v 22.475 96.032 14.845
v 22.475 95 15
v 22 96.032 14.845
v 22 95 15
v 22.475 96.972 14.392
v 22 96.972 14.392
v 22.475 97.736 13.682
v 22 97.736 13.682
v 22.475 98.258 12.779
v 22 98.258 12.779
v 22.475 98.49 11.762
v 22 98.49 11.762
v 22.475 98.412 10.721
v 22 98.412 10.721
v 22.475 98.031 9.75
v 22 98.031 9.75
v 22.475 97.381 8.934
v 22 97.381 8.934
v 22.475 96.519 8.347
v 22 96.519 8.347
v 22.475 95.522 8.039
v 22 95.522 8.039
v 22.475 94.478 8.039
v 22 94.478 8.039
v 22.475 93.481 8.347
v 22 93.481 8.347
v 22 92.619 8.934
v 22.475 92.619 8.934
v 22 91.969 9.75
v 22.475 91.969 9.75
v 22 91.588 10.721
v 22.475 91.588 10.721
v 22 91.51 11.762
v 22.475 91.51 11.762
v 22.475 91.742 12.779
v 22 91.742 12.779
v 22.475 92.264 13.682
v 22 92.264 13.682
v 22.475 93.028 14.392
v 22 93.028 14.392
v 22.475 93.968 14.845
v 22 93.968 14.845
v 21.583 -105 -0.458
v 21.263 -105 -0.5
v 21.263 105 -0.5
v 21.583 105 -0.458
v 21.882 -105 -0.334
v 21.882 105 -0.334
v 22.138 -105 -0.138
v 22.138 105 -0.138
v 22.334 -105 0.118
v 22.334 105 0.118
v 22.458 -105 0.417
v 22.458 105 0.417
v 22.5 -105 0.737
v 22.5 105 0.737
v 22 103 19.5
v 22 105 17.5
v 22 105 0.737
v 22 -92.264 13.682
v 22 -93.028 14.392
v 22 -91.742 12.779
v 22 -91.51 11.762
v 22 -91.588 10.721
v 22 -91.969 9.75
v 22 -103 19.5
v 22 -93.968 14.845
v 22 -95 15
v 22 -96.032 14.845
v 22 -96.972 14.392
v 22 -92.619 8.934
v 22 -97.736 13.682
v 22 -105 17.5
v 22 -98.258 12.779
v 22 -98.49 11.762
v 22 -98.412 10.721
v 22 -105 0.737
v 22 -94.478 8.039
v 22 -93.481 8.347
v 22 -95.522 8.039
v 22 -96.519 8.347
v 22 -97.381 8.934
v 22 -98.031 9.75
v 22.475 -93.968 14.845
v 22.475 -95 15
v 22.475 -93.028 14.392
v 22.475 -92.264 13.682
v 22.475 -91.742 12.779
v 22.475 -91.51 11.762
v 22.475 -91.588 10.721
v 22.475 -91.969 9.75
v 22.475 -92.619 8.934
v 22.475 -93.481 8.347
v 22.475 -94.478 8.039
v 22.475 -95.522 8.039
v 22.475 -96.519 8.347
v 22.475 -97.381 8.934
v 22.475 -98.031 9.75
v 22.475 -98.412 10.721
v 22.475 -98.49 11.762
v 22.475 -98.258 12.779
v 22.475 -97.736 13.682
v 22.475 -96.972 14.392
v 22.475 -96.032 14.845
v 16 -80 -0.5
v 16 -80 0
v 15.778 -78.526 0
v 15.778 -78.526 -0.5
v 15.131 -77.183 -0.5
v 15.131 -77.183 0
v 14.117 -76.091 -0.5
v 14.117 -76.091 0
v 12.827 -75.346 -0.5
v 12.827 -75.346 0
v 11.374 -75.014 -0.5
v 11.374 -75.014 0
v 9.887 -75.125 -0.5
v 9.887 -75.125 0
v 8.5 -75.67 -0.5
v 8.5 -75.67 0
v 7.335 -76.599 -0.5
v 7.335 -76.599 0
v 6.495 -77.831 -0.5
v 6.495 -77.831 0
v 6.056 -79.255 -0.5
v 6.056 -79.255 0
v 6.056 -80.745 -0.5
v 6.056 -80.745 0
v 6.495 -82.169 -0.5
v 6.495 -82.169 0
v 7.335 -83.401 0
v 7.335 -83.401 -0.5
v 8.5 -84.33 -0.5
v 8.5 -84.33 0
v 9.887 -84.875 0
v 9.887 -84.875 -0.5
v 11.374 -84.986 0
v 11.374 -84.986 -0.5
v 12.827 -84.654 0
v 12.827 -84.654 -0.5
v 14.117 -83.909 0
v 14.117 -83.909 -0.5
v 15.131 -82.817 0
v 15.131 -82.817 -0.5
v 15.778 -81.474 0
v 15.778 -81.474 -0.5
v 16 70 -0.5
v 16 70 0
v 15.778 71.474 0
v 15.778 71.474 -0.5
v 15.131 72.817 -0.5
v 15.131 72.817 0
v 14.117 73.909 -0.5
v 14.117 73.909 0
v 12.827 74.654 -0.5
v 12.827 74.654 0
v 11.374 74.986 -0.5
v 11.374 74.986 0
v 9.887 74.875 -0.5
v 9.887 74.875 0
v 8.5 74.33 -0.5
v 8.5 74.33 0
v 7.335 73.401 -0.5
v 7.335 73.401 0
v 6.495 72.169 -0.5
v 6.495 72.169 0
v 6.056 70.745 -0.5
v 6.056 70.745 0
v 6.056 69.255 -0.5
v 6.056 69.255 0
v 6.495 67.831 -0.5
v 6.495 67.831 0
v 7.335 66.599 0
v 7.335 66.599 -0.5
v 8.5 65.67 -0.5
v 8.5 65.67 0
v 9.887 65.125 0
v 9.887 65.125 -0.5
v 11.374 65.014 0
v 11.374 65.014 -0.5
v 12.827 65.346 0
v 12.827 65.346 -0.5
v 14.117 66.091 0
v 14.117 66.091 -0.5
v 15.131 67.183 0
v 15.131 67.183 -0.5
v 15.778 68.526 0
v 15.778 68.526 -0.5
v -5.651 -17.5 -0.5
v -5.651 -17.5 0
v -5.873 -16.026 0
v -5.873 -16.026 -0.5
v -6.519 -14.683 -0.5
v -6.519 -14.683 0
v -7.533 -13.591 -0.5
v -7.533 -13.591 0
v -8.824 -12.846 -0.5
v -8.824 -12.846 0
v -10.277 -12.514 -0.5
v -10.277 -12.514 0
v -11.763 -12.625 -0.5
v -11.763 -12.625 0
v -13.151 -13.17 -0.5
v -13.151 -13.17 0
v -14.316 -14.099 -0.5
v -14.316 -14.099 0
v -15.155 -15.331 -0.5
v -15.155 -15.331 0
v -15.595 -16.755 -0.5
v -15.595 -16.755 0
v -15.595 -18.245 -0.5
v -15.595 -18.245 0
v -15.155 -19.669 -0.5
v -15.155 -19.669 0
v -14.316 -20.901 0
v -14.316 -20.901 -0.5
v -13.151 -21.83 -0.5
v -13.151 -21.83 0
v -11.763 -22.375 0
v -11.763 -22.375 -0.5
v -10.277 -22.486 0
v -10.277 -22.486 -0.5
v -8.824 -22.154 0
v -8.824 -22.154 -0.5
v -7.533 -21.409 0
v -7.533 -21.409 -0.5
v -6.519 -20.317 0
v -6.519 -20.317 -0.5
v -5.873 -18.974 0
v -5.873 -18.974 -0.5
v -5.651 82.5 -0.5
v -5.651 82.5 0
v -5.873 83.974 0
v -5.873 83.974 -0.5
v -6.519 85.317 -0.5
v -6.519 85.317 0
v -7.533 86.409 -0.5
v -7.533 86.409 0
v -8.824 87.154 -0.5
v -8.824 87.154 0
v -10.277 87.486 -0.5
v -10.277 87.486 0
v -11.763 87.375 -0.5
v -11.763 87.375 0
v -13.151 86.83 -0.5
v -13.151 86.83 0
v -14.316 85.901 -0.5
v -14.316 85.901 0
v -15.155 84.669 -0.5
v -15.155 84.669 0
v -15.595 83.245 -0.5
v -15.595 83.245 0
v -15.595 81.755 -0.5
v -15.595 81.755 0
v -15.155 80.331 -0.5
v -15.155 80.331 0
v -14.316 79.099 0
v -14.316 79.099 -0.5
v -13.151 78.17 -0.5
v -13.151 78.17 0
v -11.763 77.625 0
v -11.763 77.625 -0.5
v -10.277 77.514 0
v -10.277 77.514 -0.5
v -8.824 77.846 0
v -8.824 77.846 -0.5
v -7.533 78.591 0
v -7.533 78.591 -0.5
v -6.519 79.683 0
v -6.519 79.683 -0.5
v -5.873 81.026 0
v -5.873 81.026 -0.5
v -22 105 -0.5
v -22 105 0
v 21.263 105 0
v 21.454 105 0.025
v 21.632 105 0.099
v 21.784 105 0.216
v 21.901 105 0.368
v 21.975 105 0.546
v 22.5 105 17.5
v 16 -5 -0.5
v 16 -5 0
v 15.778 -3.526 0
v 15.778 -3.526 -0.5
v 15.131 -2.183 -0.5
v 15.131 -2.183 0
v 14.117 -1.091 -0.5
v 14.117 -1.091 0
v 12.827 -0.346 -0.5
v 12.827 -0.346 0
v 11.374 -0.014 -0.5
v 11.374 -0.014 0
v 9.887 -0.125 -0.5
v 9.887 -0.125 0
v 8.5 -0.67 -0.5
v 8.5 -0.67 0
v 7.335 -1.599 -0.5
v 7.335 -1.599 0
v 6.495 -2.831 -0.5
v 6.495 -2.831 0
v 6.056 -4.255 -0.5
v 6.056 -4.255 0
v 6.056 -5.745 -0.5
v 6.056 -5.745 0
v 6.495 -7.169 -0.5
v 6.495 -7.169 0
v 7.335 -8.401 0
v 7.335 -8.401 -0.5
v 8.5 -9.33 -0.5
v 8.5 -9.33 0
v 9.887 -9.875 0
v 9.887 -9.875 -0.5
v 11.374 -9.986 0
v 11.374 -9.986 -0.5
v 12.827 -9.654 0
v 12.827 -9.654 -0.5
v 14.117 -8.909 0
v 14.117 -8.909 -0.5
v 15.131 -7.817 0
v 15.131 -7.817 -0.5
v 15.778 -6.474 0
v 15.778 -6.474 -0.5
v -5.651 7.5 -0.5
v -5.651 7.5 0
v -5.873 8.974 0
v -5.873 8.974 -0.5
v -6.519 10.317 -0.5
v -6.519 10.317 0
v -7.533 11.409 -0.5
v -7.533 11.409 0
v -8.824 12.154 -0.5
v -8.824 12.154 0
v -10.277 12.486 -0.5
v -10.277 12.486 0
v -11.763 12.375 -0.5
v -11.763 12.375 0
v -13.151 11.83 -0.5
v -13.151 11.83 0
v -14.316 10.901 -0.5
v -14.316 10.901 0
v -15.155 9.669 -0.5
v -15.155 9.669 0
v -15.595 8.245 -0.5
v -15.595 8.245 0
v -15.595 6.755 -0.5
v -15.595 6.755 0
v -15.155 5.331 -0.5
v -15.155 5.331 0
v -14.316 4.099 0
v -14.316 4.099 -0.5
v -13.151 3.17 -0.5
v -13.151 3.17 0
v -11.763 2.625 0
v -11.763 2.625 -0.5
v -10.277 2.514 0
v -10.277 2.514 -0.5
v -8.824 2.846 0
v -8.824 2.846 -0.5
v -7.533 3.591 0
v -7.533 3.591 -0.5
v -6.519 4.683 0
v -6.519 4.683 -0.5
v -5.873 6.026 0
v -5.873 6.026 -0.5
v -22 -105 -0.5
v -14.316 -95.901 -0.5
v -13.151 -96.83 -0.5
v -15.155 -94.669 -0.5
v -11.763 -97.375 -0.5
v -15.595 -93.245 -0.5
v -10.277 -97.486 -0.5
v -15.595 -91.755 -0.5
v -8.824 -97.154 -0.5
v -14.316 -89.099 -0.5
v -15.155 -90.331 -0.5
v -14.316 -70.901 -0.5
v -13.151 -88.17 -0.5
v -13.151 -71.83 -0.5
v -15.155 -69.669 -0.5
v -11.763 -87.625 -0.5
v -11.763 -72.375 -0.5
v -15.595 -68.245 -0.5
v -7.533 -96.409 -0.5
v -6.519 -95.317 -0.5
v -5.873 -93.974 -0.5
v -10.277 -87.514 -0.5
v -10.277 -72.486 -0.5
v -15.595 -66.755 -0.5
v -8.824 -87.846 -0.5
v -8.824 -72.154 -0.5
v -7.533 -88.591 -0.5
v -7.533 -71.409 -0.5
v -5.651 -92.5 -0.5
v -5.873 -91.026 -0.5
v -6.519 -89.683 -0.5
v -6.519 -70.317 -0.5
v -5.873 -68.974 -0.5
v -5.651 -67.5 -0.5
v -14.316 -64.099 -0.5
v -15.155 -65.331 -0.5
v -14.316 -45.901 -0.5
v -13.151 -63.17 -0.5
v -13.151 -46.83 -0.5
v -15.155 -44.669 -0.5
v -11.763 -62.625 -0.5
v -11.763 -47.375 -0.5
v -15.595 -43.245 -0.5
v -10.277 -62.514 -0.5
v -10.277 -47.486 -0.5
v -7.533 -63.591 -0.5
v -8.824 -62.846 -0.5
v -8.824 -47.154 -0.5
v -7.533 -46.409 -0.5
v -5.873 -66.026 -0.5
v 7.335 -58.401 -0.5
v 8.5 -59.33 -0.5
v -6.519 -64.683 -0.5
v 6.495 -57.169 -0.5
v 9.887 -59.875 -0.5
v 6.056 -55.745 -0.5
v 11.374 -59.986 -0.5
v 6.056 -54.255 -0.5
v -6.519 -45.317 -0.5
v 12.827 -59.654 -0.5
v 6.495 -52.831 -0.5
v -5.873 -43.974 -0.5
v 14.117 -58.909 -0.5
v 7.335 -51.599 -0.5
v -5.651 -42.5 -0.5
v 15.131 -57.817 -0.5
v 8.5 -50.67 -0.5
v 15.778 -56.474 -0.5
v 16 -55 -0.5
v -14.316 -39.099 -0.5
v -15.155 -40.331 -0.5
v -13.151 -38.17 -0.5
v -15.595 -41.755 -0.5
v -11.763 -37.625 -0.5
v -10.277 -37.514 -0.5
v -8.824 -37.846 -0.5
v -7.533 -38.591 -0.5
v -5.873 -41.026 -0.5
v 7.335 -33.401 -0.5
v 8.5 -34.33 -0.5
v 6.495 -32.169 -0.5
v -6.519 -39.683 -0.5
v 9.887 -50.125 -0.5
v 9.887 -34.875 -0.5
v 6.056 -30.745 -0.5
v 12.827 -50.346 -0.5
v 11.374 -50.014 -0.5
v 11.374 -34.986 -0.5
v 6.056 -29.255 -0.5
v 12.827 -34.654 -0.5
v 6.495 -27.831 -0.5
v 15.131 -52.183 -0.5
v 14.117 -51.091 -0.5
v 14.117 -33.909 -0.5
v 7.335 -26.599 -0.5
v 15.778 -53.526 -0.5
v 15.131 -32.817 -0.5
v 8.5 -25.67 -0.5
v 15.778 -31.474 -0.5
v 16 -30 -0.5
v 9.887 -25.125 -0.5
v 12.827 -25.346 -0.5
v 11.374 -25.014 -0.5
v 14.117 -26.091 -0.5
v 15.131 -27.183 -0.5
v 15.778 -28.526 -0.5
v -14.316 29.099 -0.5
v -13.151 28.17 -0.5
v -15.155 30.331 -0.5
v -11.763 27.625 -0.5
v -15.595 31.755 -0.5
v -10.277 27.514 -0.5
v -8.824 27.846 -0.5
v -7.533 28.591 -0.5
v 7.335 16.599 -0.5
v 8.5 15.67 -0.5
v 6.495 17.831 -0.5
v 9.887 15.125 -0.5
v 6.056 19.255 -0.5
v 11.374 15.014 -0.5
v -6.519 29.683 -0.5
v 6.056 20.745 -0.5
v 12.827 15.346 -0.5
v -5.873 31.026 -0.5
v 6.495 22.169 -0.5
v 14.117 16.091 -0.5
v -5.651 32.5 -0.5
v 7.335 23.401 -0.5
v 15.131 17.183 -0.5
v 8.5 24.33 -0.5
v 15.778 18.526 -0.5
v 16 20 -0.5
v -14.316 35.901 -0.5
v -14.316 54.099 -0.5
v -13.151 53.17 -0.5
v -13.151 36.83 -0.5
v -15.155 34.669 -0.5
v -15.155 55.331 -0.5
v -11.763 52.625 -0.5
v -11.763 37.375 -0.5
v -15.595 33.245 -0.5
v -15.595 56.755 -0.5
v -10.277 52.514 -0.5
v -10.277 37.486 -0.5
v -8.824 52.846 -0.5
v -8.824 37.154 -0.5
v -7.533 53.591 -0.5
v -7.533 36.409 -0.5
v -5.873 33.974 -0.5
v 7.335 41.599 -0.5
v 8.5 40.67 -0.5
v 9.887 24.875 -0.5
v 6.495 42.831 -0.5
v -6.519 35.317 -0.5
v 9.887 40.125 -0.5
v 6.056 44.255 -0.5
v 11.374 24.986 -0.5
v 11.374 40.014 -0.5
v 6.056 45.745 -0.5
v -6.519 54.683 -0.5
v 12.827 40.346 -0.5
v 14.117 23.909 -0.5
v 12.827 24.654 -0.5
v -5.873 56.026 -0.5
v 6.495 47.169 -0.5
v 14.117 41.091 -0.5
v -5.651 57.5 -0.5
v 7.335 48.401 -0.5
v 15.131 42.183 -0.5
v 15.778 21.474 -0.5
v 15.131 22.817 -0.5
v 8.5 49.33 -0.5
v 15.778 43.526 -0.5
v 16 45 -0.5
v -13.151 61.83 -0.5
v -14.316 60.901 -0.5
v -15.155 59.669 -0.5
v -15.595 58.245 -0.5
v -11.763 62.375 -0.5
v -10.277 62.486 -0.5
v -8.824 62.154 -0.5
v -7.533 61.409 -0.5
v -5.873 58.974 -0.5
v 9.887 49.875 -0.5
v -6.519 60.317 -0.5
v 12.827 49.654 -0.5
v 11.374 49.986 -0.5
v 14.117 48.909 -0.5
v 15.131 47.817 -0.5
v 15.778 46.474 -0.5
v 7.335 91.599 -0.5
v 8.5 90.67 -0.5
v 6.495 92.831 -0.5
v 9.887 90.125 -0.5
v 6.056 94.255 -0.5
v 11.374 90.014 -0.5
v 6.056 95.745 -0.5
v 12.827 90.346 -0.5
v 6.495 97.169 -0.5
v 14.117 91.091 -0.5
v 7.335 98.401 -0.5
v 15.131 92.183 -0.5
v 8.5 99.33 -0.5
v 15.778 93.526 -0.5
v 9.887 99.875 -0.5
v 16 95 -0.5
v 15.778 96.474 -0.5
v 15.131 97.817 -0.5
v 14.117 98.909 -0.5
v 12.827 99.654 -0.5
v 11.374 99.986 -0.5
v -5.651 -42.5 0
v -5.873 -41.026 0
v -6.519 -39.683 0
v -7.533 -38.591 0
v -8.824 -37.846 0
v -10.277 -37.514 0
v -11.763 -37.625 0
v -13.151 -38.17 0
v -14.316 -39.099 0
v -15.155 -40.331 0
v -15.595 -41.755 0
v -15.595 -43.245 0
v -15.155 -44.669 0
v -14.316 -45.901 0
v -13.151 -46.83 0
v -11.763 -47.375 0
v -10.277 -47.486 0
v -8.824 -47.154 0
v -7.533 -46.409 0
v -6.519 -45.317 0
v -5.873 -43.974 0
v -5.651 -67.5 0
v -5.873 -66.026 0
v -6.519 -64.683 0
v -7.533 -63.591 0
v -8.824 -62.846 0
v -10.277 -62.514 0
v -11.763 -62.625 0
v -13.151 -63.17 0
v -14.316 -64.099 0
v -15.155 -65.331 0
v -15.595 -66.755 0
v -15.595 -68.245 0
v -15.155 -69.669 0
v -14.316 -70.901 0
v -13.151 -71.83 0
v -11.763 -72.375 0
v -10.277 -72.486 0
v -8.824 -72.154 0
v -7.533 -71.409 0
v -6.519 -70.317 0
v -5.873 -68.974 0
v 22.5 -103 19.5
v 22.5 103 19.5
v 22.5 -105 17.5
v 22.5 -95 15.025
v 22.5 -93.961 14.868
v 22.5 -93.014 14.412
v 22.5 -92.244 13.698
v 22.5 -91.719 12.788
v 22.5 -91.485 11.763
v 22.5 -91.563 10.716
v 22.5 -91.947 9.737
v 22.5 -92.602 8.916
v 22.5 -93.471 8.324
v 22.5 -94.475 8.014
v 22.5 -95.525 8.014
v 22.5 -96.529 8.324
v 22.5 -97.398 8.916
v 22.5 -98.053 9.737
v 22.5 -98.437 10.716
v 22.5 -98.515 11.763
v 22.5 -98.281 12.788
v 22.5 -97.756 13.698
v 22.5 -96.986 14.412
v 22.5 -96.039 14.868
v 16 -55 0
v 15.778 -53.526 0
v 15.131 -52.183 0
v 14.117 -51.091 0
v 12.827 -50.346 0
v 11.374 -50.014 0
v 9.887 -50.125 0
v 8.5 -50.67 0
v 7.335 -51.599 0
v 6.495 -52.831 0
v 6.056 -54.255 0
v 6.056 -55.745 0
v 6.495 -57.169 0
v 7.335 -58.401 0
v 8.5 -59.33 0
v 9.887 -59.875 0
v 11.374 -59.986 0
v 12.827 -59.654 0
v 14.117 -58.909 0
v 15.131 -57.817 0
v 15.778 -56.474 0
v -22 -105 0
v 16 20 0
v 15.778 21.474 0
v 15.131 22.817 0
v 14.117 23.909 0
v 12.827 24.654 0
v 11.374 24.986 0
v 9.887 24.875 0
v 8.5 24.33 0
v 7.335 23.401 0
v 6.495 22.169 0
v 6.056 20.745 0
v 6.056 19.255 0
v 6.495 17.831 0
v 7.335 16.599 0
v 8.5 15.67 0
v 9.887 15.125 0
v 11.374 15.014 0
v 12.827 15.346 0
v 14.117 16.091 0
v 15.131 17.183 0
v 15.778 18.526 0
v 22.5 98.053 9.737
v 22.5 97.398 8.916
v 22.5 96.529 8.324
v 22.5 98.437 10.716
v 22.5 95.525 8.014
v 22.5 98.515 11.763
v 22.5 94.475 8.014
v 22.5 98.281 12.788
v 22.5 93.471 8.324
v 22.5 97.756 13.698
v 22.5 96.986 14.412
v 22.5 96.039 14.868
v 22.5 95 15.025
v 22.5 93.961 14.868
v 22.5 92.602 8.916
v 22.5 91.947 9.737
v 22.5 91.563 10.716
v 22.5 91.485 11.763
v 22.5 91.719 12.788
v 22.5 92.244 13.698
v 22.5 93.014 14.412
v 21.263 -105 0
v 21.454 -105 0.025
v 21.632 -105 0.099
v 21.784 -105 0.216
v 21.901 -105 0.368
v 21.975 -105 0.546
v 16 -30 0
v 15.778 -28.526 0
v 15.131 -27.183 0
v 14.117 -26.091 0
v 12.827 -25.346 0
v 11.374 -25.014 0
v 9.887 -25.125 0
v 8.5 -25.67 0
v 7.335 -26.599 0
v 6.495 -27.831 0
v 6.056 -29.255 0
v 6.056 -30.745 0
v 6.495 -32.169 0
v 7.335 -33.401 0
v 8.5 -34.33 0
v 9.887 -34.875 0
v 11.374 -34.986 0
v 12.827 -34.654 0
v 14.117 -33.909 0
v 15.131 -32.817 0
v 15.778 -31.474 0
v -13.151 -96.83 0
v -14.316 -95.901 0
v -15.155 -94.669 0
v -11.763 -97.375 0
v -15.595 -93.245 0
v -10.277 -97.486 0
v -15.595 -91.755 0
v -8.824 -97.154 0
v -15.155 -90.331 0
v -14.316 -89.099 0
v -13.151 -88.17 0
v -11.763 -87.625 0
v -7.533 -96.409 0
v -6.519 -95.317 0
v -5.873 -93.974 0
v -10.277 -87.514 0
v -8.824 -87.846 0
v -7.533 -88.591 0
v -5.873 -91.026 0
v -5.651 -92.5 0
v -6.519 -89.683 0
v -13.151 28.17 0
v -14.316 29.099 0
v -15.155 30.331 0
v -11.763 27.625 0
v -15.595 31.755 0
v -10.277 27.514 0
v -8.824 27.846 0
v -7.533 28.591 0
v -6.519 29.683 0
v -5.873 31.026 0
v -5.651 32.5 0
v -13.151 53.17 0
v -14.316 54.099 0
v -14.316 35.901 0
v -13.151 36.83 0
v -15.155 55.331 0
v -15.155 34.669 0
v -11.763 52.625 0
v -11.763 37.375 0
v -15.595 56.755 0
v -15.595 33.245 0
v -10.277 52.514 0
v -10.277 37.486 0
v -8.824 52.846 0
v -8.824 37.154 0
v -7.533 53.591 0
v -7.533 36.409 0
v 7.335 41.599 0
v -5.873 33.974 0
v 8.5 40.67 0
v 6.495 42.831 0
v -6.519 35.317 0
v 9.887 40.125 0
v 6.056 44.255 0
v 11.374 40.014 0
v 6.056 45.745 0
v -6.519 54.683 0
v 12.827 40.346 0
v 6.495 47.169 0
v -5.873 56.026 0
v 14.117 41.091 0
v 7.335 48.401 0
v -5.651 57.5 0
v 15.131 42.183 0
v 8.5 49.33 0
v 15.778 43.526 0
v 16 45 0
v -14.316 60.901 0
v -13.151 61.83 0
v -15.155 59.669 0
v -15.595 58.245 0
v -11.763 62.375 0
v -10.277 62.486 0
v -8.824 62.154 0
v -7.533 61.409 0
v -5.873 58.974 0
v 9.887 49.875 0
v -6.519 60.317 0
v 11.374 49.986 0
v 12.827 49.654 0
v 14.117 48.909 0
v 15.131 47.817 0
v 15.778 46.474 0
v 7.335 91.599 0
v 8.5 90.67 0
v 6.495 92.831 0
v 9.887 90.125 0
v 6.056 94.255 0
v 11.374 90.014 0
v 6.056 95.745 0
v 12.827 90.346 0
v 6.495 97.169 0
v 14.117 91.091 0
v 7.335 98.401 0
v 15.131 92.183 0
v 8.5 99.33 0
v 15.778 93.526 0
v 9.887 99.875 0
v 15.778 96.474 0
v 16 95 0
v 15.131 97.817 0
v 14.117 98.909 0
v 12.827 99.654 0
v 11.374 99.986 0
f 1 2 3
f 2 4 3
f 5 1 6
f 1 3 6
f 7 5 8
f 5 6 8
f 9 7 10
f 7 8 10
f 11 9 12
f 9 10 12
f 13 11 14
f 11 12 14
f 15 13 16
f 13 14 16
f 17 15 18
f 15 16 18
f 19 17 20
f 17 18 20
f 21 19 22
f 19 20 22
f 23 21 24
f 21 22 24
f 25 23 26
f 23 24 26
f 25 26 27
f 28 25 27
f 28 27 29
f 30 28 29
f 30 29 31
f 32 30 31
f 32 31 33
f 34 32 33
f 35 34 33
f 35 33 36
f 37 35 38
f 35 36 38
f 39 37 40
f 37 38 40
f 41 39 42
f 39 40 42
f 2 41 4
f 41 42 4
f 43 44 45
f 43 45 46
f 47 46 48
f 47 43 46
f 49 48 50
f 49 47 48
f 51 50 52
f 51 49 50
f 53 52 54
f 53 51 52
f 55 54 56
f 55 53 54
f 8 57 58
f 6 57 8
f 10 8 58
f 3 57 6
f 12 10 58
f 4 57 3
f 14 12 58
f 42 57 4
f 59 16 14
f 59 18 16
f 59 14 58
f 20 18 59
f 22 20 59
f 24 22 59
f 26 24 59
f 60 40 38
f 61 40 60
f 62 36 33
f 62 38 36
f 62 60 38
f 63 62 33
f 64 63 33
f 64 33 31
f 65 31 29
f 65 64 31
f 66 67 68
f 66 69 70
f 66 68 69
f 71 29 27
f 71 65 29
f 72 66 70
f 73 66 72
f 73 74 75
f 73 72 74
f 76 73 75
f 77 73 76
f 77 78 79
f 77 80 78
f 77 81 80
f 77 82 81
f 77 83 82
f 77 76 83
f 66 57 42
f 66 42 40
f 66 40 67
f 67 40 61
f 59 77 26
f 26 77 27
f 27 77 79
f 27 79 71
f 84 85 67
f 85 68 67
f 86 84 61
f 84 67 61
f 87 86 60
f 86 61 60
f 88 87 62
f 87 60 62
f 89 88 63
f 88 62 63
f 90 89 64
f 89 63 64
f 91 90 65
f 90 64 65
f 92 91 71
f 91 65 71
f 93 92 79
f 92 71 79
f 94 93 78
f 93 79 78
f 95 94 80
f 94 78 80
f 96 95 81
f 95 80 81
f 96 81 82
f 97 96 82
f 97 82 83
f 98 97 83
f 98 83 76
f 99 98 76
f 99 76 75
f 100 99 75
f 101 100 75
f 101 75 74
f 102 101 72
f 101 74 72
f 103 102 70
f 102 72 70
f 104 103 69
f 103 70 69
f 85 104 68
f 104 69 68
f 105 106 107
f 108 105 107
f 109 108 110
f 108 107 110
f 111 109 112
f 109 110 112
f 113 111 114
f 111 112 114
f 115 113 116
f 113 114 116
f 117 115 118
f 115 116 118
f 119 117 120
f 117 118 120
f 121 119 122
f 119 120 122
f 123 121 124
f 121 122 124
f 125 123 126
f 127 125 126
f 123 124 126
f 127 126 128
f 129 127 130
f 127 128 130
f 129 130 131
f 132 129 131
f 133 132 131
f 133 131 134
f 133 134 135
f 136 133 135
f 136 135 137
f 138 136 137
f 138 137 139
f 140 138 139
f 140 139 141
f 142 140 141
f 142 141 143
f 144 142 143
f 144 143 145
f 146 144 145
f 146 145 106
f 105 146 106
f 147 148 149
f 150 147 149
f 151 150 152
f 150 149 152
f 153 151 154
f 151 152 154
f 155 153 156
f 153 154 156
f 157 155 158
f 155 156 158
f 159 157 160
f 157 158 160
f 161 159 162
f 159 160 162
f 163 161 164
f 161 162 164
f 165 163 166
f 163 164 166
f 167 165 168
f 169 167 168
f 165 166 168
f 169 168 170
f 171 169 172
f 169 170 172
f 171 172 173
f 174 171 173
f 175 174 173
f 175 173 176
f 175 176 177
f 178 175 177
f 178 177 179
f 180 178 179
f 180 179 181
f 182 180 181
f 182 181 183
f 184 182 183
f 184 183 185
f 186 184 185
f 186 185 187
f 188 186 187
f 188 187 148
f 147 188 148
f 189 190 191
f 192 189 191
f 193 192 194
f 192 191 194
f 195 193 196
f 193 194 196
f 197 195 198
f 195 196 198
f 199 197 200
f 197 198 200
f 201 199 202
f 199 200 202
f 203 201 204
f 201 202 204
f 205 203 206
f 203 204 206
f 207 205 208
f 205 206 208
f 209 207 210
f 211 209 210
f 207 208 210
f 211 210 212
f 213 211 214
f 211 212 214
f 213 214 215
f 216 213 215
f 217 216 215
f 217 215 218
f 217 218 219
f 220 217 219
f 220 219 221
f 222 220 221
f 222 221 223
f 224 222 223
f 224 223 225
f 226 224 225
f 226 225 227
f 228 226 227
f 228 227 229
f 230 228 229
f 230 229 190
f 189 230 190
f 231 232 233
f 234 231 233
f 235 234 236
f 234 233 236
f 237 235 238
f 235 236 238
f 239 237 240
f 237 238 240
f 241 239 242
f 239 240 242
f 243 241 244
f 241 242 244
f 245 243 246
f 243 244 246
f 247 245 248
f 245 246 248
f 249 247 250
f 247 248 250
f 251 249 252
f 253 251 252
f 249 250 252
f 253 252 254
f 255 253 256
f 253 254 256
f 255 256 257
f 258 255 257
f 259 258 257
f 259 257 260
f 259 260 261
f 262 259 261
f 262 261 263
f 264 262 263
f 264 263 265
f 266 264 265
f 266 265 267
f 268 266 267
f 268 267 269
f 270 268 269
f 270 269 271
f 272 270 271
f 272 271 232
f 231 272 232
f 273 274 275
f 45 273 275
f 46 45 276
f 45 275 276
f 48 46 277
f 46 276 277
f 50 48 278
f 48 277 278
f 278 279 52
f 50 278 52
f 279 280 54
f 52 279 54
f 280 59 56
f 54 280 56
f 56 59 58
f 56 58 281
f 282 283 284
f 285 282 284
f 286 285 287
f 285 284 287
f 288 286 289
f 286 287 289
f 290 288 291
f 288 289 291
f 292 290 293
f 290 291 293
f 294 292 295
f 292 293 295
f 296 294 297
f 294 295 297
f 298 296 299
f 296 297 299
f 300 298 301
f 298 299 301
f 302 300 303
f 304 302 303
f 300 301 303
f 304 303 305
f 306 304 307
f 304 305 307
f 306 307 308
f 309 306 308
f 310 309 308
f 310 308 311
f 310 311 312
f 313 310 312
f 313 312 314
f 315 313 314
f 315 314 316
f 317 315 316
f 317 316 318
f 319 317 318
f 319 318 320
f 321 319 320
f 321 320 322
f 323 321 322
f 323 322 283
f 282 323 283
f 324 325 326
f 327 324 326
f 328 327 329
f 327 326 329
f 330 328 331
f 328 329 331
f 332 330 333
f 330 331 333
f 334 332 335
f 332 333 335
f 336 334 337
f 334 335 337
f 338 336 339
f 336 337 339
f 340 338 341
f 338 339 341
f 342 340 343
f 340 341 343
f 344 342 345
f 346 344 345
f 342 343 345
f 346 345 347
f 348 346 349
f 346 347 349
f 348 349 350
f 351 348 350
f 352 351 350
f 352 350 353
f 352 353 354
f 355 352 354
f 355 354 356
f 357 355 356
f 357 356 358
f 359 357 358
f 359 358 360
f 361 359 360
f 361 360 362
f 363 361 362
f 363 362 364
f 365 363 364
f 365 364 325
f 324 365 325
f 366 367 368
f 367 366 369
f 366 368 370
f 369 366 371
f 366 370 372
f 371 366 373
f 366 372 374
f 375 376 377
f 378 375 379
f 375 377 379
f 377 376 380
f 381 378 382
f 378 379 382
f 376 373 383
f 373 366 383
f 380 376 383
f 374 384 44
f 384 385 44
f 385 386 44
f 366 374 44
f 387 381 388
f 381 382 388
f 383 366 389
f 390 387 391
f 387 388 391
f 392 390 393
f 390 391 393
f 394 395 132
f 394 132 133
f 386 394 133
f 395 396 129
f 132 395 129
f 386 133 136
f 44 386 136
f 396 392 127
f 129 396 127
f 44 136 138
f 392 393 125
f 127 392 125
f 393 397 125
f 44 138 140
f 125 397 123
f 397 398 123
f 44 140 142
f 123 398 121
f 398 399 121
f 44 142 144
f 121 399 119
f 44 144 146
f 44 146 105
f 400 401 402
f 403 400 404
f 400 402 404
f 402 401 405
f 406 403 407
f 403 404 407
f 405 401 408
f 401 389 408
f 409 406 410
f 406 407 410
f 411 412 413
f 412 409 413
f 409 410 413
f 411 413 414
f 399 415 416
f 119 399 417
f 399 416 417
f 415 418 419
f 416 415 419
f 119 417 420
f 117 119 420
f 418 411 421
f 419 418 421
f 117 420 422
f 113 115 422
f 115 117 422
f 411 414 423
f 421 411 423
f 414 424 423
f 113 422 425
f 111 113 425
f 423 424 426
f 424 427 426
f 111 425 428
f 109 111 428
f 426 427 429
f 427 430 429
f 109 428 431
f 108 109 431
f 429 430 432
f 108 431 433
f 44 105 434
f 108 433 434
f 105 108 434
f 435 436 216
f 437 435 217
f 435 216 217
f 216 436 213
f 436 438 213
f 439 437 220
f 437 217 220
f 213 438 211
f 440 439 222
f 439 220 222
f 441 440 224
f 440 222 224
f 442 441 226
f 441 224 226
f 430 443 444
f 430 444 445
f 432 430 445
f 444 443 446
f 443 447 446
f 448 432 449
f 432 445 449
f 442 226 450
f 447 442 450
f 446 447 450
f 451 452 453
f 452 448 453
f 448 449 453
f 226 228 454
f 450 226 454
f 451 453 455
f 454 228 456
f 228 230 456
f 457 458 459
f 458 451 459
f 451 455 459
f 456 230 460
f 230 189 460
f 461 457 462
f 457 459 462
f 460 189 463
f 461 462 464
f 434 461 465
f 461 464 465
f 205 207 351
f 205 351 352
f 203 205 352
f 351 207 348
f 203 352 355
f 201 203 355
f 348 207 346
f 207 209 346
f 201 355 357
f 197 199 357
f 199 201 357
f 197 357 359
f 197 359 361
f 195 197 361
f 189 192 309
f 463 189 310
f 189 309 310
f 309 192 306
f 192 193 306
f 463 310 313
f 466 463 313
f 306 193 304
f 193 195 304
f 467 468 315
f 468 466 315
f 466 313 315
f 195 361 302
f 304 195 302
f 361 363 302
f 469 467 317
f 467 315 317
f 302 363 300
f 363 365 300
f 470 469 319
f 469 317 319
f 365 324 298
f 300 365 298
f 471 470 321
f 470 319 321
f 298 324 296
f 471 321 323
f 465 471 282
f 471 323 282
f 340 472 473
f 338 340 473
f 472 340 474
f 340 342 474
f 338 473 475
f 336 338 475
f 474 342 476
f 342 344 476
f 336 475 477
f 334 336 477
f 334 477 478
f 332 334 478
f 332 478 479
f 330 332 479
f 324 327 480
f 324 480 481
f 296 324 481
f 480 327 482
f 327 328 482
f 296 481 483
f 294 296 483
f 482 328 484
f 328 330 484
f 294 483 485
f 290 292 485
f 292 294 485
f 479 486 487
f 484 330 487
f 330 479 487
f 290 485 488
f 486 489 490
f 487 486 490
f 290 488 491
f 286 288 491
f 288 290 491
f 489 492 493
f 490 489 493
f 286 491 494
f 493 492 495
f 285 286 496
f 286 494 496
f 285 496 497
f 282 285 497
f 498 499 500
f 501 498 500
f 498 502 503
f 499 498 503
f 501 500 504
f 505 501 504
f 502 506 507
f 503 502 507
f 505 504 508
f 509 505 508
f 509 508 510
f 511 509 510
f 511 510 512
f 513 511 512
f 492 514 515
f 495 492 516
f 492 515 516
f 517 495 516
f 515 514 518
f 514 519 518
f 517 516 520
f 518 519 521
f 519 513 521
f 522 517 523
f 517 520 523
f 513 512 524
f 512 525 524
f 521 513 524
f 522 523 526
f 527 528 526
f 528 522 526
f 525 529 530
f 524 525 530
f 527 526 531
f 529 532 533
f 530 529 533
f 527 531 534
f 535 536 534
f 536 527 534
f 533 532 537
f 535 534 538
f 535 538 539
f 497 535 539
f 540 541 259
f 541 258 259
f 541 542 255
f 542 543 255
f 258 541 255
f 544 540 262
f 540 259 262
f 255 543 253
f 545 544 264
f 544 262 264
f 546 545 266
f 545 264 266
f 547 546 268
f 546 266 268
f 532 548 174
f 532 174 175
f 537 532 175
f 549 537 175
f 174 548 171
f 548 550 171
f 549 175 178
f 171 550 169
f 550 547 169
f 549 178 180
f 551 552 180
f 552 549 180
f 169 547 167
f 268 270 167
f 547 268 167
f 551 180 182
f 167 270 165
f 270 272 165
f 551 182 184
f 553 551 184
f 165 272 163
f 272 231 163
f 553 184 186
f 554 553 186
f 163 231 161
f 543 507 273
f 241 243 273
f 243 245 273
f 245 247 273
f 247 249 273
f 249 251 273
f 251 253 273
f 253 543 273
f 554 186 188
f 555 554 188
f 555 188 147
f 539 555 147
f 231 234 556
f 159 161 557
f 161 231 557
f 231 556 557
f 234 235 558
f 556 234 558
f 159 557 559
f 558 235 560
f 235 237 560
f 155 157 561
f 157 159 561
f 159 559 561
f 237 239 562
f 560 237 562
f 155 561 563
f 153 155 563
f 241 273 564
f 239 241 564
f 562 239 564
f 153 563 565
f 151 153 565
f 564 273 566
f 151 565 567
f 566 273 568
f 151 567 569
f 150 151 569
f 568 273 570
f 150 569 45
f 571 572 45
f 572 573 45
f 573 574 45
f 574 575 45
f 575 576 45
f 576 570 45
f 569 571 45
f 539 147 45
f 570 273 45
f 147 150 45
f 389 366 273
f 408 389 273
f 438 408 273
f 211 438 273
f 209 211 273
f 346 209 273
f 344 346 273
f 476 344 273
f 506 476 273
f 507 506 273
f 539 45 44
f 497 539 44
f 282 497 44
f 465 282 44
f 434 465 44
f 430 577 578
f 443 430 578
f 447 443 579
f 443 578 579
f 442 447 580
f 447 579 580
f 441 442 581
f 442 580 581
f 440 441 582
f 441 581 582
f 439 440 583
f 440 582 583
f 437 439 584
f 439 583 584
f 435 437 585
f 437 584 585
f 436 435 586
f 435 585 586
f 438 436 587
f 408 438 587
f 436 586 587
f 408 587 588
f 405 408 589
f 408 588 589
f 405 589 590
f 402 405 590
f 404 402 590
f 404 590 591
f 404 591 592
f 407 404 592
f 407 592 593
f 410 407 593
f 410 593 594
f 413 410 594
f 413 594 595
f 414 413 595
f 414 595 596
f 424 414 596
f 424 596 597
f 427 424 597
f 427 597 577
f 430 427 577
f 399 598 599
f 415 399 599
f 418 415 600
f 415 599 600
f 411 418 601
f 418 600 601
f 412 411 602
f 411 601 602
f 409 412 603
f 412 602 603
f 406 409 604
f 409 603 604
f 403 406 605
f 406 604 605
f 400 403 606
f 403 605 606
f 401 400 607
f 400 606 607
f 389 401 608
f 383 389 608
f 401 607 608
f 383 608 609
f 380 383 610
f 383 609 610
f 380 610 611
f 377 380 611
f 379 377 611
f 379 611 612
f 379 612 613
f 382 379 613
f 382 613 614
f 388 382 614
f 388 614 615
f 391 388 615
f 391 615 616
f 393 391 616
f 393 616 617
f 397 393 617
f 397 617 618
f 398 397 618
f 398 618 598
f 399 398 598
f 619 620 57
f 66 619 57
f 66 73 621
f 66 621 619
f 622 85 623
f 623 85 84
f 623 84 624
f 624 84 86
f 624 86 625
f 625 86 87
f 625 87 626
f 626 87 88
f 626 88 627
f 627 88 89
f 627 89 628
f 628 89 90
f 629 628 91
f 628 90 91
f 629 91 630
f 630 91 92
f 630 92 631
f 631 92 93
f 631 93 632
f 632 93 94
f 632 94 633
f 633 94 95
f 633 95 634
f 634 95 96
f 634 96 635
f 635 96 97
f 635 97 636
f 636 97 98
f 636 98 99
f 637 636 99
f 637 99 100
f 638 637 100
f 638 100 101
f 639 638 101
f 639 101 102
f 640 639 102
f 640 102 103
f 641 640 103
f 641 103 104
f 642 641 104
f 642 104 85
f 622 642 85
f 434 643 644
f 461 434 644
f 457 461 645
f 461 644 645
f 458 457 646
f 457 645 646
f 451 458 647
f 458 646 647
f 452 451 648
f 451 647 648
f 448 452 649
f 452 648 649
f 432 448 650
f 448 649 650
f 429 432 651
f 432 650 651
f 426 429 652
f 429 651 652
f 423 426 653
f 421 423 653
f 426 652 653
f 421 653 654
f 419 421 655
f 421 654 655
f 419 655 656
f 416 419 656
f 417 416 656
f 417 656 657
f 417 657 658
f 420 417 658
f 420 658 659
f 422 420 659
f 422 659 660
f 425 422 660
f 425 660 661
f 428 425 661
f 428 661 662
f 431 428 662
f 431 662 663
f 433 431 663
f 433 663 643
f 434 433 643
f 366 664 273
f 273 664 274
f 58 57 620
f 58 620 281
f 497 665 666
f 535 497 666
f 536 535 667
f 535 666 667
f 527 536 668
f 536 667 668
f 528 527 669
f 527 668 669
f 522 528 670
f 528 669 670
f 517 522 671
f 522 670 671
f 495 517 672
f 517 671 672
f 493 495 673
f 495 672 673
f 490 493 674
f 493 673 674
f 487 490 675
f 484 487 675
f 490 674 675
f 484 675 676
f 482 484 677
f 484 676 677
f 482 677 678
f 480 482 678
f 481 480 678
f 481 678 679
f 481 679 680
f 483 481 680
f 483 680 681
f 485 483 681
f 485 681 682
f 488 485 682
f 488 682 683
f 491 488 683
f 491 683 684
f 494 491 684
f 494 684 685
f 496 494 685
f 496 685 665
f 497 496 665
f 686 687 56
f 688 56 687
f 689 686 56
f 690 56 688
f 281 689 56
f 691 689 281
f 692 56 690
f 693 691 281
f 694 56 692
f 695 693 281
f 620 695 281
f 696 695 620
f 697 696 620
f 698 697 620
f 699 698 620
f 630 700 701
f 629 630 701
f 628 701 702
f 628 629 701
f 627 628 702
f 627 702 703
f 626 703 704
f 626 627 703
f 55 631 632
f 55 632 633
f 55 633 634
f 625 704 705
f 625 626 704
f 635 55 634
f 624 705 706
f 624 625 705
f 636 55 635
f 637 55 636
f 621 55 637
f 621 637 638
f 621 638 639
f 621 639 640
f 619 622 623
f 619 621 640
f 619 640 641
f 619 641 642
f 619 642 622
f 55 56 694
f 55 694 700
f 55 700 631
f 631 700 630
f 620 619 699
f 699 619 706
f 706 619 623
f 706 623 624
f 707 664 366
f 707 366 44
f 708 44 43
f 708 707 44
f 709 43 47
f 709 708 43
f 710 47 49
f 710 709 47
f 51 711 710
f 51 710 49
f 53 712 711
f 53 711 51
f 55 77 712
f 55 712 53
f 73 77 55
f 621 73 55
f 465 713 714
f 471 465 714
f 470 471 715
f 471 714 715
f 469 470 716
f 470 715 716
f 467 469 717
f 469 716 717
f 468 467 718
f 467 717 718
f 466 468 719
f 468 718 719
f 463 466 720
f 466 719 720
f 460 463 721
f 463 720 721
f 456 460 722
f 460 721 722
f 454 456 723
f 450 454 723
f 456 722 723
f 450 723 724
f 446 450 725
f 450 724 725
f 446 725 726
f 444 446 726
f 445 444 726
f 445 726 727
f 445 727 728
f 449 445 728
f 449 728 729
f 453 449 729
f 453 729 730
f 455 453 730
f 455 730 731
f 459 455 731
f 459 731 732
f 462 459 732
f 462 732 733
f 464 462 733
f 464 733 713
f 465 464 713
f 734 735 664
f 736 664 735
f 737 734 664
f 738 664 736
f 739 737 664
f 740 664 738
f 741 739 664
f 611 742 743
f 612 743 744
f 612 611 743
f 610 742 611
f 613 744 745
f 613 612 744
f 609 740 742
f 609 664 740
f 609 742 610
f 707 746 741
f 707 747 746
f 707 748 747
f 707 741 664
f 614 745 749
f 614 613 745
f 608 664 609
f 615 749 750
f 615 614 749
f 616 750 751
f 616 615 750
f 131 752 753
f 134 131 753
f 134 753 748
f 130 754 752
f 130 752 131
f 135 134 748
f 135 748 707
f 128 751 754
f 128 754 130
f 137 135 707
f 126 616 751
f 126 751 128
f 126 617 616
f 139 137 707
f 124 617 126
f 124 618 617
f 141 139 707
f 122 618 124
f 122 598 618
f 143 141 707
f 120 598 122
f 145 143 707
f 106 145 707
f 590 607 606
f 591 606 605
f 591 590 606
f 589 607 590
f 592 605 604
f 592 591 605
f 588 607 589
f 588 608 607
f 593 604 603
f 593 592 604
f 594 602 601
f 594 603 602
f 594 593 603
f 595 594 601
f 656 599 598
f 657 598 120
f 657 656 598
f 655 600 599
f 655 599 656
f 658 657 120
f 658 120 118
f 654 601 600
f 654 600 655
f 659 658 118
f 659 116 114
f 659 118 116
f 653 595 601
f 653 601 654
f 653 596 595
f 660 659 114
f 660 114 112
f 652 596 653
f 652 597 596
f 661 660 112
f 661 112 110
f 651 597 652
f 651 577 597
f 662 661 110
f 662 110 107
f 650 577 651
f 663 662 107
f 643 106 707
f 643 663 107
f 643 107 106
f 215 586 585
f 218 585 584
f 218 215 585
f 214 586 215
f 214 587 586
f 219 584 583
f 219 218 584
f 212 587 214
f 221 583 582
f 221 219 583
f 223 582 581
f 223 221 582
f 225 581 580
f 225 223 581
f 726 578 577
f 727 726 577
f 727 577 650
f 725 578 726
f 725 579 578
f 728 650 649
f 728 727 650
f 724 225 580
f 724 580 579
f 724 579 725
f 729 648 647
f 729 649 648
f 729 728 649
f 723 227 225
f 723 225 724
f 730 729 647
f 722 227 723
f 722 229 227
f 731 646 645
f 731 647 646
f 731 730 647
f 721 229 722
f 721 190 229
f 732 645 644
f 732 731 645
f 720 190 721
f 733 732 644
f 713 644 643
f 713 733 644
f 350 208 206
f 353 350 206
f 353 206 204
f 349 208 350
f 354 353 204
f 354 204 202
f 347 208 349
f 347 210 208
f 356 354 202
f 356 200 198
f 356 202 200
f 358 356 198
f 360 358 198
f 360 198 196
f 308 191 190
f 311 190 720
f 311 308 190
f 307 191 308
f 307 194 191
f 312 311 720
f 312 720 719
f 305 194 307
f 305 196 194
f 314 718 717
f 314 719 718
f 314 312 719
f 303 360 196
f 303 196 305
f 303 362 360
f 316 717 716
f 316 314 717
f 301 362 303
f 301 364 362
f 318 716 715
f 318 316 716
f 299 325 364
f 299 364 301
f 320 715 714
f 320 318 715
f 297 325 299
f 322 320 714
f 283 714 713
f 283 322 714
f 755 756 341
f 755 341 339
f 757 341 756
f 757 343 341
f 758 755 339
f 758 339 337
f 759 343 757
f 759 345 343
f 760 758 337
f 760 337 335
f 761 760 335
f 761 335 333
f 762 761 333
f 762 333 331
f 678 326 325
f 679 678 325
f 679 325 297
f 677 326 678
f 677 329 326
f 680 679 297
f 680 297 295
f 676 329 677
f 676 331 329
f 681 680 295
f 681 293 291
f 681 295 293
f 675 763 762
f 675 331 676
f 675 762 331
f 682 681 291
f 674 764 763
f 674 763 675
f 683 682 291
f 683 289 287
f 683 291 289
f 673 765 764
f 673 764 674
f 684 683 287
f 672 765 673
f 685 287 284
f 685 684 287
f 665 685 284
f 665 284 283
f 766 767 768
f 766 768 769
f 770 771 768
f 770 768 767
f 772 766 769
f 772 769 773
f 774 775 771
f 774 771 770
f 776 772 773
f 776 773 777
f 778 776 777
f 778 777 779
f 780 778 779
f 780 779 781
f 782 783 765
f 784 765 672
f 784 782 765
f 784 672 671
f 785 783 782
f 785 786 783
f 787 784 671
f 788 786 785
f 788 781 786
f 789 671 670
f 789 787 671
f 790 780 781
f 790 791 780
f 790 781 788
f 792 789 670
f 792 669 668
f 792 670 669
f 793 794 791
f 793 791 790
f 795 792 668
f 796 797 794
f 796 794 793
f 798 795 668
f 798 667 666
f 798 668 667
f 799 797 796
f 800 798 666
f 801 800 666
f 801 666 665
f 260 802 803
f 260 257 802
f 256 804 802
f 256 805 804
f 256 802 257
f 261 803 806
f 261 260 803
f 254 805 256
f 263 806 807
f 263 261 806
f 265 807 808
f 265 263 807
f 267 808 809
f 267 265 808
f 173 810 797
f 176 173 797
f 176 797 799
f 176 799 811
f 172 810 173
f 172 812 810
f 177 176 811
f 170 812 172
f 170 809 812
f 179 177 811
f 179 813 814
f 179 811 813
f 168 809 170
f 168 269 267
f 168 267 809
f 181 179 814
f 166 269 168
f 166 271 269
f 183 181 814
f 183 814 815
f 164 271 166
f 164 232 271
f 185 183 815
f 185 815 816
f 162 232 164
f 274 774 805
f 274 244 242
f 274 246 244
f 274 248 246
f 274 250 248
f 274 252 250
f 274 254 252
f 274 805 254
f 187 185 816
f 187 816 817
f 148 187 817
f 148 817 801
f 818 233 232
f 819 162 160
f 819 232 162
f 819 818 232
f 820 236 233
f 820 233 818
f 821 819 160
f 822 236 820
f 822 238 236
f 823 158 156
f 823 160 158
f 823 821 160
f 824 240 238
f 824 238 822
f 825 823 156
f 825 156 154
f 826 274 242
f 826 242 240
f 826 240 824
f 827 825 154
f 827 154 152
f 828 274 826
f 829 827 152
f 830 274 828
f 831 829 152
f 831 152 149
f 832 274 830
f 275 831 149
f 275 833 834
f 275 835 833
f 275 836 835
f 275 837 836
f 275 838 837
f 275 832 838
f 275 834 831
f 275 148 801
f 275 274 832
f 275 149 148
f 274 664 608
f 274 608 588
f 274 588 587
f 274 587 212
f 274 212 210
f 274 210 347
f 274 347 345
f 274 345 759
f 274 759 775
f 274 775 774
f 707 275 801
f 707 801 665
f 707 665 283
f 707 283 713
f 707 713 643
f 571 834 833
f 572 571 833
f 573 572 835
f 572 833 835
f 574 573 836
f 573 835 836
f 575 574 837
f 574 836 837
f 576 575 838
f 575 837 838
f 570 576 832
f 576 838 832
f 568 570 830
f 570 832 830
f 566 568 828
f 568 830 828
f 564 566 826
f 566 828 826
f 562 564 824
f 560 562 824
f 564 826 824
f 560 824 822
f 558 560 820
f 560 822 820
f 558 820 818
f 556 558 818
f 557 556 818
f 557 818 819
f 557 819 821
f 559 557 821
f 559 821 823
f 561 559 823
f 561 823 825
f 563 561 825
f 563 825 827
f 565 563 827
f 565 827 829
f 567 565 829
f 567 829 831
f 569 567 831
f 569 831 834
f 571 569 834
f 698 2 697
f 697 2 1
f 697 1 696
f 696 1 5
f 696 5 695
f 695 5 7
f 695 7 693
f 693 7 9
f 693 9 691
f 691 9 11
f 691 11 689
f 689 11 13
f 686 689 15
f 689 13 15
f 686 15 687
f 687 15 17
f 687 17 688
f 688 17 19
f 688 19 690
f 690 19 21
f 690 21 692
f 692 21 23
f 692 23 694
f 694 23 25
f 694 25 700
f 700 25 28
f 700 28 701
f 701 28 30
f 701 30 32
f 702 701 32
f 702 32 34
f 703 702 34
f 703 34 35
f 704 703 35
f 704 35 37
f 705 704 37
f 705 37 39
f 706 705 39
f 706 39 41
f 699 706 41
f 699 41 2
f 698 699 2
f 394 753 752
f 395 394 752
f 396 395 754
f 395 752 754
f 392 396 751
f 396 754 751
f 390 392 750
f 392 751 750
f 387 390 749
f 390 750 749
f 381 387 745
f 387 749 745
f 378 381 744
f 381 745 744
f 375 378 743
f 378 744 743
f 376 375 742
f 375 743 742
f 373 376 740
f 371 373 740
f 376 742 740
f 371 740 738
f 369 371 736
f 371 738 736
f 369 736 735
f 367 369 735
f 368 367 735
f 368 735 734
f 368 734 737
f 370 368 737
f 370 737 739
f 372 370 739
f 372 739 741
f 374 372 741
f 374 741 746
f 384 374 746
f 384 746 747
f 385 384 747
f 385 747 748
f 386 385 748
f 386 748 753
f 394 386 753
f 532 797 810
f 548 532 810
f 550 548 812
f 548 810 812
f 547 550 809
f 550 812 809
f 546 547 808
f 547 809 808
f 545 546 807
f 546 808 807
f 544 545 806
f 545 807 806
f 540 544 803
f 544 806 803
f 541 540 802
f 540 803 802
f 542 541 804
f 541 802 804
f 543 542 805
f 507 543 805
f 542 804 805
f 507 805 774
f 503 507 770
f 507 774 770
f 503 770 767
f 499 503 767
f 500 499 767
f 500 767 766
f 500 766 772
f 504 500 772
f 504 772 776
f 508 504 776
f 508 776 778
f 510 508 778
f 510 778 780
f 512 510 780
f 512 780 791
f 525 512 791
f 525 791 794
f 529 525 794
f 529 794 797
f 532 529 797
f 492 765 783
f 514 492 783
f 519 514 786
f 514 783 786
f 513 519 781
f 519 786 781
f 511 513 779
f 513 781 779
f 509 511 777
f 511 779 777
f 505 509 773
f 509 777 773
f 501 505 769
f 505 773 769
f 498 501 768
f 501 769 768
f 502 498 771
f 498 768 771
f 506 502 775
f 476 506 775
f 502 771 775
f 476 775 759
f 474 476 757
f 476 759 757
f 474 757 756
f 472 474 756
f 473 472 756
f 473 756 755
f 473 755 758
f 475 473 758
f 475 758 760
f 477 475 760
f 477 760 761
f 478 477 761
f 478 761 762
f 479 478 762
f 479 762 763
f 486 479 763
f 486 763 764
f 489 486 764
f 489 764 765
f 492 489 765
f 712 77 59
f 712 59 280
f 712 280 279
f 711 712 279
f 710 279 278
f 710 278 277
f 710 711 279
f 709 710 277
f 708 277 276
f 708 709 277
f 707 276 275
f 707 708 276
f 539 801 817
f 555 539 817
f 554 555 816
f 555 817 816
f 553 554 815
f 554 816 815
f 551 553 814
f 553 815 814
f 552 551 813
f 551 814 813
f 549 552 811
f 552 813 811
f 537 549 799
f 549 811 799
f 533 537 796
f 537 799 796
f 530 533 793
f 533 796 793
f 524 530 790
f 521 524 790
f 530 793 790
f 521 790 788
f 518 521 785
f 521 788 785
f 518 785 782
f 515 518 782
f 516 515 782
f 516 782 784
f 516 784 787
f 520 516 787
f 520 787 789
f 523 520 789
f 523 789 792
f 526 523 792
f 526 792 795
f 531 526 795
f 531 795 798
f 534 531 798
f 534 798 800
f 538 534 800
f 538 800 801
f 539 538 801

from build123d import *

# Parameters (mm, degrees)
SKETCH1_W                          = 44
SKETCH1_H                          = 210
BASE_FLANGE1_DEPTH                 = 0.5
SKETCH6_R                          = 5
CUT_EXTRUDE1_DEPTH                 = 10
LPATTERN1_COUNT                    = 8
LPATTERN1_PITCH                    = 25
EDGE_FLANGE2_STRIP_W               = 3.4732
EDGE_FLANGE2_STRIP_H               = 0.5
EDGE_FLANGE2_STRIP_CUT_DEPTH       = 210
EDGE_FLANGE2_DEPTH                 = 210
F_7_0_7_DIAMETER_HOLE2_D           = 7
F_7_0_7_DIAMETER_HOLE2_DEPTH       = 60
F_7_0_7_DIAMETER_HOLE2_CSINK_D     = 7.05
F_7_0_7_DIAMETER_HOLE2_CSINK_ANGLE = 90
F_7_0_7_DIAMETER_HOLE2_TIP         = 2.103012167
BREAK_CORNER2_START                = 22
BREAK_CORNER2_DEPTH                = 0.5


# Read off the part's stored shape, not the designer's step: Break-Corner2
# Sheet-metal steps are written as plain solids
with BuildPart() as part:
    # Sketch1 → Base-Flange1 (new body)
    with BuildSketch(Plane.XY):
        Rectangle(SKETCH1_W, SKETCH1_H)
    extrude(amount=-BASE_FLANGE1_DEPTH)

    # Sketch6 → Cut-Extrude1 (cut)
    with BuildSketch(Plane.XY):
        with Locations((11, 95)):
            Circle(SKETCH6_R)
        with Locations((-10.650635095, 82.5)):
            Circle(SKETCH6_R)
    cut_extrude1 = extrude(amount=-CUT_EXTRUDE1_DEPTH, mode=Mode.SUBTRACT)

    # LPattern1: Cut-Extrude1 ×8
    with Locations(*[(0, -i * LPATTERN1_PITCH, 0) for i in range(1, LPATTERN1_COUNT)]):
        add(cut_extrude1, mode=Mode.SUBTRACT)

    # Edge-Flange2 strip (across the edge) → Edge-Flange2 strip cut (cut)
    with BuildSketch(Plane(origin=(22, -105, 0), x_dir=(-1, 0, 0), z_dir=(0, 1, 0))):
        with Locations((-1, -0.25)):
            Rectangle(EDGE_FLANGE2_STRIP_W, EDGE_FLANGE2_STRIP_H)
    extrude(amount=EDGE_FLANGE2_STRIP_CUT_DEPTH, mode=Mode.SUBTRACT)

    # Edge-Flange2 section (across the edge) → Edge-Flange2 (add)
    with BuildSketch(Plane(origin=(22, -105, 0), x_dir=(-1, 0, 0), z_dir=(0, 1, 0))):
        with BuildLine():
            Line((-0.5, 0.7366), (-0.5, 19.5))
            Line((-0.5, 19.5), (0, 19.5))
            Line((0, 19.5), (0, 0.7366))
            ThreePointArc((0, 0.7366), (0.215745145, 0.215745145), (0.7366, 0))
            Line((0.7366, 0), (0.7366, -0.5))
            ThreePointArc((0.7366, -0.5), (-0.137808246, -0.137808246), (-0.5, 0.7366))
        make_face()
    extrude(amount=EDGE_FLANGE2_DEPTH)

    # Ø7.0 (7) Diameter Hole2
    with Locations(Plane(origin=(22.5, 0, 0), x_dir=(0, 0, -1), z_dir=(1, 0, 0))):
        with Locations((-11.5, 95), (-11.5, -95)):
            CounterSinkHole(F_7_0_7_DIAMETER_HOLE2_D / 2, F_7_0_7_DIAMETER_HOLE2_CSINK_D / 2, depth=F_7_0_7_DIAMETER_HOLE2_DEPTH, counter_sink_angle=F_7_0_7_DIAMETER_HOLE2_CSINK_ANGLE)
            with Locations((0, 0, -(F_7_0_7_DIAMETER_HOLE2_DEPTH + F_7_0_7_DIAMETER_HOLE2_TIP / 2))):  # 118° drill point
                Cone(0, F_7_0_7_DIAMETER_HOLE2_D / 2, F_7_0_7_DIAMETER_HOLE2_TIP, mode=Mode.SUBTRACT)

    # Break-Corner2 outline → Break-Corner2 (cut)
    with BuildSketch(Plane.YZ.offset(BREAK_CORNER2_START)):
        Polygon((-105, 19.5), (-105, 17.5), (-103, 19.5), align=None)
        Polygon((105, 19.5), (103, 19.5), (105, 17.5), align=None)
    extrude(amount=BREAK_CORNER2_DEPTH, mode=Mode.SUBTRACT)


solid = part.part
